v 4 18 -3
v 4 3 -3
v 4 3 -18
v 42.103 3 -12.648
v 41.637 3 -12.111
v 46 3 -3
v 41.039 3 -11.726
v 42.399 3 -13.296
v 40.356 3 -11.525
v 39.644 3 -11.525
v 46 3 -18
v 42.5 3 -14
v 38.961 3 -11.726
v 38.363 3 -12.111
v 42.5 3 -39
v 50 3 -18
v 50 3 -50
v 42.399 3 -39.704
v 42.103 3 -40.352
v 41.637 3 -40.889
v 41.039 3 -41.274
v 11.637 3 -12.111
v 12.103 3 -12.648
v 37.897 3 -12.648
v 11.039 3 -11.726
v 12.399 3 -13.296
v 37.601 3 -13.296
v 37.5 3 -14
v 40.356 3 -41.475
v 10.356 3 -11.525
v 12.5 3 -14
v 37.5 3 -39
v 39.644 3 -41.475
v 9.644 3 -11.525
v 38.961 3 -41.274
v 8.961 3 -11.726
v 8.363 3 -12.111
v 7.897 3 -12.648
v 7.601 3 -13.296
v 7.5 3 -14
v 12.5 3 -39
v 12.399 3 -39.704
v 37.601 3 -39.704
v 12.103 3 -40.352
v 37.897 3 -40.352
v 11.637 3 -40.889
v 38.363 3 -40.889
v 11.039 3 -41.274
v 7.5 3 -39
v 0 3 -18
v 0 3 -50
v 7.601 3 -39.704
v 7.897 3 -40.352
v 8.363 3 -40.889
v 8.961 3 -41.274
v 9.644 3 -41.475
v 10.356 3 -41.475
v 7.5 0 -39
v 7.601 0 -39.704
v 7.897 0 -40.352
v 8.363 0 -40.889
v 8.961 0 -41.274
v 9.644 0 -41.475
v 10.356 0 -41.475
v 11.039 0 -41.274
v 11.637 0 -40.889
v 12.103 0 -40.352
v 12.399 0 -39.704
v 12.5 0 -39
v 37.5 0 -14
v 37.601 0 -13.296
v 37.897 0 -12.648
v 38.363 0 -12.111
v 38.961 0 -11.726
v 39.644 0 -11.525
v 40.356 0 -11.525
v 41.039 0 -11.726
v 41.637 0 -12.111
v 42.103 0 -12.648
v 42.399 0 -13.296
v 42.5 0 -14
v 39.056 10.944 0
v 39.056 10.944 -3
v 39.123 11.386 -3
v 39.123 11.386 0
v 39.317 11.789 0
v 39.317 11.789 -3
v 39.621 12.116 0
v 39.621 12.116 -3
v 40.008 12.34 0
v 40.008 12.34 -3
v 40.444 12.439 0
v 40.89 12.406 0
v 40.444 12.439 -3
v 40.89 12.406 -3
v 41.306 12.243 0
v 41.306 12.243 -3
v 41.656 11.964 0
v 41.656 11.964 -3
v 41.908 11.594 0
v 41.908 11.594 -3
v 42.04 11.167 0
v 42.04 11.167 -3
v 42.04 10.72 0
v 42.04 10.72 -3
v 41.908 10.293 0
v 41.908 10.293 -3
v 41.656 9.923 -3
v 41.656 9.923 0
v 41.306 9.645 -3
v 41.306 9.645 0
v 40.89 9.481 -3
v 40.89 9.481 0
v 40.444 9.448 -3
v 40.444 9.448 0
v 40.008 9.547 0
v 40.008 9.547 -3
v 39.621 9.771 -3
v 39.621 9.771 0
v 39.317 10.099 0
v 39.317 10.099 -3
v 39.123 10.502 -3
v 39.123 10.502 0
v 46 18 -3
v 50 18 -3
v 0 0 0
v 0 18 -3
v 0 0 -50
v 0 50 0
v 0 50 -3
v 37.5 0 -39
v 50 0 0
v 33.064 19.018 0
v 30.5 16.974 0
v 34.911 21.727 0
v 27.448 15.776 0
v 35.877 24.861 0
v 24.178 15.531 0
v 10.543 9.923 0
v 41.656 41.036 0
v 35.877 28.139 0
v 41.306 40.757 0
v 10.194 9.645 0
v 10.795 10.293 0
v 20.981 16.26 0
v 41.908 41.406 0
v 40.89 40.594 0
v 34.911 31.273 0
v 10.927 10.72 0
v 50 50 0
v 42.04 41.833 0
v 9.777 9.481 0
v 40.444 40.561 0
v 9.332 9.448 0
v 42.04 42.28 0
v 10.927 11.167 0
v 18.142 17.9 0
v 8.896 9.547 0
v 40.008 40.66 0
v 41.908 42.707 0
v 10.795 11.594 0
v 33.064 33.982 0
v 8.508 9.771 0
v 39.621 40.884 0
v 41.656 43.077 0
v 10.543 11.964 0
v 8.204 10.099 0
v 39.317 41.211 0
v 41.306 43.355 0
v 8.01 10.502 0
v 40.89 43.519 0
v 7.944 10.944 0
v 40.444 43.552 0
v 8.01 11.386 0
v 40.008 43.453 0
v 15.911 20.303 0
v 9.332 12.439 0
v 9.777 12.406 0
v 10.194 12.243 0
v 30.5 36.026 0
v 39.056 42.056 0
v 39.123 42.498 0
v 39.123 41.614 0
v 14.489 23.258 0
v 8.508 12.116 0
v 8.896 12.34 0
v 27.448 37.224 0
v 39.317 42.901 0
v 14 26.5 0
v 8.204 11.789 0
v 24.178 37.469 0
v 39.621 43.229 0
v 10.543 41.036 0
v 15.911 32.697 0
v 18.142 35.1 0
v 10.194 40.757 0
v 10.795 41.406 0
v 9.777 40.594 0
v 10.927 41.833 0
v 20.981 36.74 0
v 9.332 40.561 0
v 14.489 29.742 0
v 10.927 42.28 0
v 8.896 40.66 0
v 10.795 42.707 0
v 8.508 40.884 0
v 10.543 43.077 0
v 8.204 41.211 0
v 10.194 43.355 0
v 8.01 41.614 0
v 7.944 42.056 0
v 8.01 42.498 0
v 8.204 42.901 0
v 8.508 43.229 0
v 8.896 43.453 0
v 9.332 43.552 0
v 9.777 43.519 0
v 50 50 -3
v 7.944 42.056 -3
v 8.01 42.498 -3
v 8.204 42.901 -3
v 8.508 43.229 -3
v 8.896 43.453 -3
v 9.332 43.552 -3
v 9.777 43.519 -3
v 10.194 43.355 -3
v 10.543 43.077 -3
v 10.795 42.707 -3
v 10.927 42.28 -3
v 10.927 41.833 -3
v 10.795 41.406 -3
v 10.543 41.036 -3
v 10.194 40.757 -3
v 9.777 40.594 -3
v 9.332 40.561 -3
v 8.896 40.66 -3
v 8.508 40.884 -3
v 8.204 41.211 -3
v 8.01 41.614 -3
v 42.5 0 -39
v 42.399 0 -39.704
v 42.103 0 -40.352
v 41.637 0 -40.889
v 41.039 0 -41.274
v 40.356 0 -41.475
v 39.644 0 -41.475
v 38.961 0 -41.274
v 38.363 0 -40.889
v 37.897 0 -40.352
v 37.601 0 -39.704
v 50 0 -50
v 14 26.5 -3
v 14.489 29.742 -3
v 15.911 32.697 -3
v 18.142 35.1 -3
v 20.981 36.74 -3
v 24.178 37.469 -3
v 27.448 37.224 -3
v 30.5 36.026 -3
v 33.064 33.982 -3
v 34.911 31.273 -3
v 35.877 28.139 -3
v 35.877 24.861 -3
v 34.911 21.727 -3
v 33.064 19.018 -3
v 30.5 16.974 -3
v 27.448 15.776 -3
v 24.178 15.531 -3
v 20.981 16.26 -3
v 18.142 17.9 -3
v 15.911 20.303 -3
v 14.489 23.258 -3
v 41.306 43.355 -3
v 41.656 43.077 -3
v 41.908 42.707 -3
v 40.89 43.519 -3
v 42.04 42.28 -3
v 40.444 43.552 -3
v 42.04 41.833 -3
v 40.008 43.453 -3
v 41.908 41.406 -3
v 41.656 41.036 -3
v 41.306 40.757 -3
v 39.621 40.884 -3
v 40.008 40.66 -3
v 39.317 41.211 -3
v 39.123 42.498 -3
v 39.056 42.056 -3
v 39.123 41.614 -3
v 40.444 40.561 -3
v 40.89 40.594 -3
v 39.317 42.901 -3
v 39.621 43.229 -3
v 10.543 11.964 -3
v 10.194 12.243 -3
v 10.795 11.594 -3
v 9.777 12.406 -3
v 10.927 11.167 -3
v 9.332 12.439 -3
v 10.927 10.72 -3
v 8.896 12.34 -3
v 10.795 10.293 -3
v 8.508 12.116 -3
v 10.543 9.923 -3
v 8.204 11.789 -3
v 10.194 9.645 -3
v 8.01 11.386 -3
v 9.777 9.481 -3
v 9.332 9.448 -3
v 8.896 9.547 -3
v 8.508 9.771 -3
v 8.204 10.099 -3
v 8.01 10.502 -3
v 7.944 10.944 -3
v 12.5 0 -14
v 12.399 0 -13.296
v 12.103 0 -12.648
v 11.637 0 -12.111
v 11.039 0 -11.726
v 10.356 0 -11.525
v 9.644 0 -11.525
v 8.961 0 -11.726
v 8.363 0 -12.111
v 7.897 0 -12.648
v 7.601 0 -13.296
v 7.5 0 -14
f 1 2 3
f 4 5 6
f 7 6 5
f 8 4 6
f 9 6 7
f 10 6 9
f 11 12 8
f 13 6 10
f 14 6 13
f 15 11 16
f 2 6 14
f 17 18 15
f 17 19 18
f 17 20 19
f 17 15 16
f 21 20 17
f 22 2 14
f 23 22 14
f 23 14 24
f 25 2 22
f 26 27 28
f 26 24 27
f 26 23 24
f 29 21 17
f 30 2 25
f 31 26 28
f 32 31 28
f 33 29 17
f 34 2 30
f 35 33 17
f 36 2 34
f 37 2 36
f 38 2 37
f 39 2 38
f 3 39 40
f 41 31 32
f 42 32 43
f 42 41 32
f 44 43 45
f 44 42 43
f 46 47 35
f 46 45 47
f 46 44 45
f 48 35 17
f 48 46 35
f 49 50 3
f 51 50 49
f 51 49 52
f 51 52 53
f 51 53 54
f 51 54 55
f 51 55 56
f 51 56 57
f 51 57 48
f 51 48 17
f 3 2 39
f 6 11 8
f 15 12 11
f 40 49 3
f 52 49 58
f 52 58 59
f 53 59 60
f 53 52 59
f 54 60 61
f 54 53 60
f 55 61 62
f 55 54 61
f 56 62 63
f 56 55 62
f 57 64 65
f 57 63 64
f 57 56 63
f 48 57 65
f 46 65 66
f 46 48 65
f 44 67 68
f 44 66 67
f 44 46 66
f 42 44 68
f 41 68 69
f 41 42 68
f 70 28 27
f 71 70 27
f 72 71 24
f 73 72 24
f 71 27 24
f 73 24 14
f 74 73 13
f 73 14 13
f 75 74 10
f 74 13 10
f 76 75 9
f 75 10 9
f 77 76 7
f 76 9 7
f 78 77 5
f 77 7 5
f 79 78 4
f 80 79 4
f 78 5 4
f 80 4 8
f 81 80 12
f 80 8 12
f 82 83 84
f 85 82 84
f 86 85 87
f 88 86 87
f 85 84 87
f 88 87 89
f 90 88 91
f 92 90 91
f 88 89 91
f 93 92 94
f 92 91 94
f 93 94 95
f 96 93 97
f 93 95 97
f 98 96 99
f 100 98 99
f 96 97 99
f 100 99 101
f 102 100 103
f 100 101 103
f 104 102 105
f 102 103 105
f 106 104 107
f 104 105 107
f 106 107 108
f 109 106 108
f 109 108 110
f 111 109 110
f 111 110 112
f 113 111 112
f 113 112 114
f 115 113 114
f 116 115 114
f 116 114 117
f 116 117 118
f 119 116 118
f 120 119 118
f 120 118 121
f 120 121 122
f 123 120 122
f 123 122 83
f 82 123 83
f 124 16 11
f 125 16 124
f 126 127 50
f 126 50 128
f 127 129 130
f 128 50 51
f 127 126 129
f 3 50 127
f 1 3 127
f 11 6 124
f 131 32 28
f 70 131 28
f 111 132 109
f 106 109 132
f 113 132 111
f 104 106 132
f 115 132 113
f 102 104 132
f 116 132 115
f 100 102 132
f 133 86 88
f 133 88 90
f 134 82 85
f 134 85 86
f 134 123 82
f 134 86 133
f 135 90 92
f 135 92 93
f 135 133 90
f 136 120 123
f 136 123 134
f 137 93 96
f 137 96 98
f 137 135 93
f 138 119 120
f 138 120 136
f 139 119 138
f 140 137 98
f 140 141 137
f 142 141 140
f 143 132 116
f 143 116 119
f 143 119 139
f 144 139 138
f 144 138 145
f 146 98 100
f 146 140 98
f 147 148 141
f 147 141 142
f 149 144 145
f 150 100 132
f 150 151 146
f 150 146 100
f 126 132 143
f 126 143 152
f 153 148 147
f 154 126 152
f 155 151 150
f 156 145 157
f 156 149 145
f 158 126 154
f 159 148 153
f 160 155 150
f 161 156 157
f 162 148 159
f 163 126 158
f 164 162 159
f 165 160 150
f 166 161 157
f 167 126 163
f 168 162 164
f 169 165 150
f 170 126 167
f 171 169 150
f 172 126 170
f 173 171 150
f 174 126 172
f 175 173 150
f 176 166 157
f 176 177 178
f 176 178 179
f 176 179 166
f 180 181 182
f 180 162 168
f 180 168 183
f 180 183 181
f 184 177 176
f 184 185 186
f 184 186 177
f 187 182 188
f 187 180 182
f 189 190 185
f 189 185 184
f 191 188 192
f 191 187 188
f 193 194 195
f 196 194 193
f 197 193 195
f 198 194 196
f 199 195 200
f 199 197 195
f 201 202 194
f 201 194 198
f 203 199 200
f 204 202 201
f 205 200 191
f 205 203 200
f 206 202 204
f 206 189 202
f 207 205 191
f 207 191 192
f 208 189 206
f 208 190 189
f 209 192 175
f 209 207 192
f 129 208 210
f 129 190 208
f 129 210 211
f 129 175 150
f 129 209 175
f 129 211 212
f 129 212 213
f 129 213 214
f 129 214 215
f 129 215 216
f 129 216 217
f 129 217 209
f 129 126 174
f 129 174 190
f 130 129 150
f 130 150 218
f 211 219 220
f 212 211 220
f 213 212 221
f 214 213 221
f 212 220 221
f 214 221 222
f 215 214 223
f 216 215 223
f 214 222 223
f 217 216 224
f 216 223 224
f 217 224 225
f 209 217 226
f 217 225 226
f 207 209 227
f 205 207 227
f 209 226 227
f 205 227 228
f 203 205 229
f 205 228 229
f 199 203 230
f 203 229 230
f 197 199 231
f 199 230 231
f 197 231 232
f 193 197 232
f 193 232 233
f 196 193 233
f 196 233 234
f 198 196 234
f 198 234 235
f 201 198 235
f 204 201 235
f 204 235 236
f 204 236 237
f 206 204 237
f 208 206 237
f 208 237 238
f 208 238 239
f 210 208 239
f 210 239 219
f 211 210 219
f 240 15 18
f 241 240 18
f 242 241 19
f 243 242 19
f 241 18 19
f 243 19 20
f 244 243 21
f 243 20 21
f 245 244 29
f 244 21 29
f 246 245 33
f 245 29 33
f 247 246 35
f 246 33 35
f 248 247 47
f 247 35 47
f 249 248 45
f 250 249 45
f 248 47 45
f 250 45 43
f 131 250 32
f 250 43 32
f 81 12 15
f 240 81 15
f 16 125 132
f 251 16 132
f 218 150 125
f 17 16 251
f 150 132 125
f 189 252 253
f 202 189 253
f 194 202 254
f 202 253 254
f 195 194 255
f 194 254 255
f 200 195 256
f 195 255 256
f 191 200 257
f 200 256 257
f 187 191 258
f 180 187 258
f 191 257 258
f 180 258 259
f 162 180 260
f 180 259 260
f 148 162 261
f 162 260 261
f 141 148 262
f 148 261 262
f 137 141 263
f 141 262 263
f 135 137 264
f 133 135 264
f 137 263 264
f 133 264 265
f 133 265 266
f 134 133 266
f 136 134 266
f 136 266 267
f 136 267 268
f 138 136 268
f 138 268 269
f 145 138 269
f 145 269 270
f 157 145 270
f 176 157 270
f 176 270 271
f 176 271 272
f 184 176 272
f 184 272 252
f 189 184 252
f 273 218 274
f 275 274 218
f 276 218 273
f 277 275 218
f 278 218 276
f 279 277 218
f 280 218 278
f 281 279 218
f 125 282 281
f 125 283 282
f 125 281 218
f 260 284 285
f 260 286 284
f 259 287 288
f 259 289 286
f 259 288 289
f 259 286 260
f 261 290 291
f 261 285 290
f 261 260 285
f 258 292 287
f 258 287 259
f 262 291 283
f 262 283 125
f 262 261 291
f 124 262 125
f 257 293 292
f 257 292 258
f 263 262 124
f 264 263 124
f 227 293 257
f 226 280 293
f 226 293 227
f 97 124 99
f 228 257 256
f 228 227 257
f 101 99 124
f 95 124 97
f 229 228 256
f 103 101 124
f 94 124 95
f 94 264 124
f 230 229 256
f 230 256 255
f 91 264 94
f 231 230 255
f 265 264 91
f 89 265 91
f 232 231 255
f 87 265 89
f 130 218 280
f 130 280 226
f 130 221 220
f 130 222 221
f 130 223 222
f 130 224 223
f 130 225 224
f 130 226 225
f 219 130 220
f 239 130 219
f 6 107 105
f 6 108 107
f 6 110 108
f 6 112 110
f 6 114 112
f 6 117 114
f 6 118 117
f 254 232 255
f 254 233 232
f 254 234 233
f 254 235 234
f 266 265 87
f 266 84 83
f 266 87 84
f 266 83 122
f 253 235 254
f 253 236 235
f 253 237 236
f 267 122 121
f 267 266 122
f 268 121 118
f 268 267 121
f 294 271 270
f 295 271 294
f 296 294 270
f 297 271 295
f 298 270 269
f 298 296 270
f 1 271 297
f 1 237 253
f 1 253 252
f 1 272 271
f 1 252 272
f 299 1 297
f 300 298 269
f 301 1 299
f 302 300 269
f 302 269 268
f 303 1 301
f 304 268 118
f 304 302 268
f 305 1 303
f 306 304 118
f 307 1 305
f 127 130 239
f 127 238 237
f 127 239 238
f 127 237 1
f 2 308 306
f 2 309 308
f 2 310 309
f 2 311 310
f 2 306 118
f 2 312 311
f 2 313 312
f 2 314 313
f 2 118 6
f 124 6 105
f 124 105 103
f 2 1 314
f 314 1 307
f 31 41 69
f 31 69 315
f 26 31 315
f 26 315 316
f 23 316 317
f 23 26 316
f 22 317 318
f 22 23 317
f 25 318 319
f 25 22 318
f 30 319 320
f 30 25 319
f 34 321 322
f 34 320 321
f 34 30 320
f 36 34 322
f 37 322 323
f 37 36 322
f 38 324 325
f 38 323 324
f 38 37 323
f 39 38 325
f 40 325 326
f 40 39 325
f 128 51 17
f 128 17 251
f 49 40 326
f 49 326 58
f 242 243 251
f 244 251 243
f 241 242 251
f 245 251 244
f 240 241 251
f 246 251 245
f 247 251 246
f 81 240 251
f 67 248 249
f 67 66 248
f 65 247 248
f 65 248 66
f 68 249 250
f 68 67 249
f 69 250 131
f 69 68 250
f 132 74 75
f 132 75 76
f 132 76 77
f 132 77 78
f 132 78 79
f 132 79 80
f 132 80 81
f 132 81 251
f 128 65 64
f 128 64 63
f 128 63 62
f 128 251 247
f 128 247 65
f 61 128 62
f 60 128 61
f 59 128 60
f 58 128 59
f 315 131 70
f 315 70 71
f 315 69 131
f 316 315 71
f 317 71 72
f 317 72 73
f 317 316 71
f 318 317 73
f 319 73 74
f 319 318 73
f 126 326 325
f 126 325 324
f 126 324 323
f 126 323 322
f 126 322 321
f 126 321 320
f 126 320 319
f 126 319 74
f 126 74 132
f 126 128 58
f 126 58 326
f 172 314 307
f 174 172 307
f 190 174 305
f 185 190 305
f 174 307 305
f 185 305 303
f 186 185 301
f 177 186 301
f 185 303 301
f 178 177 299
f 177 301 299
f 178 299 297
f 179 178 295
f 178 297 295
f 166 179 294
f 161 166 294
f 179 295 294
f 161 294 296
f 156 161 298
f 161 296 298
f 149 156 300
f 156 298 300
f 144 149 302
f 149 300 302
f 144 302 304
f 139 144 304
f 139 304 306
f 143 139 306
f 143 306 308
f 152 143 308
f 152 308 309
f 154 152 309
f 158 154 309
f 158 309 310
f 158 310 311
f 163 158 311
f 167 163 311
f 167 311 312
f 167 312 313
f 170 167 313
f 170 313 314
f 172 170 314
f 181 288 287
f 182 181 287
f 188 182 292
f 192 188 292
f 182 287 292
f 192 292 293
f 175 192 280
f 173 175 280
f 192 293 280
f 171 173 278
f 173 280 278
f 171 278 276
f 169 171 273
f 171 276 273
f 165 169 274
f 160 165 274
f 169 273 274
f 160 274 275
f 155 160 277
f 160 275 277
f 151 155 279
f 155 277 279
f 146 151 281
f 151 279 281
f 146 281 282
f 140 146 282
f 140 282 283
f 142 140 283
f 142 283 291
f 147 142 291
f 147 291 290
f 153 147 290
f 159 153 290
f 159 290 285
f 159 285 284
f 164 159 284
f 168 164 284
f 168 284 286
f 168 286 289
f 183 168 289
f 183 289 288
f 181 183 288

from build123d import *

# Parameters (mm, degrees)
BOSS_EXTRUDE1_DEPTH = 50
SKETCH3_R           = 11
CUT_EXTRUDE1_DEPTH  = 20
CUT_EXTRUDE2_DEPTH  = 4
BOSS_EXTRUDE2_DEPTH = 4
SKETCH7_R           = 1.5
CUT_EXTRUDE3_DEPTH  = 4


with BuildPart() as part:
    # Sketch1 → Boss-Extrude1 (new body)
    with BuildSketch(Plane(origin=(0, 0, 0), x_dir=(0, 0, -1), z_dir=(1, 0, 0))):
        Polygon((0, 0), (0, 50), (3, 50), (3, 3), (50, 3), (50, 0), align=None)
    extrude(amount=BOSS_EXTRUDE1_DEPTH)

    # Sketch3 → Cut-Extrude1 (cut)
    with BuildSketch(Plane(origin=(0, 0, -3), x_dir=(-1, 0, 0), z_dir=(0, 0, -1))):
        with Locations((-25, 26.5)):
            Circle(SKETCH3_R)
    extrude(amount=-CUT_EXTRUDE1_DEPTH, mode=Mode.SUBTRACT)

    # Sketch4 → Cut-Extrude2 (cut, through all)
    with BuildSketch(Plane(origin=(0, 3, 0), x_dir=(1, 0, 0), z_dir=(0, 1, 0))):
        with BuildLine():
            Line((7.5, 14), (7.5, 39))
            ThreePointArc((7.5, 39), (10, 41.5), (12.5, 39))
            Line((12.5, 39), (12.5, 14))
            ThreePointArc((12.5, 14), (10, 11.5), (7.5, 14))
        make_face()
        with BuildLine():
            Line((42.5, 14), (42.5, 39))
            ThreePointArc((42.5, 39), (40, 41.5), (37.5, 39))
            Line((37.5, 39), (37.5, 14))
            ThreePointArc((37.5, 14), (40, 11.5), (42.5, 14))
        make_face()
    extrude(amount=-CUT_EXTRUDE2_DEPTH, mode=Mode.SUBTRACT)

    # Sketch6 → Boss-Extrude2 (add)
    with BuildSketch(Plane(origin=(50, 0, 0), x_dir=(0, 0, -1), z_dir=(1, 0, 0))):
        Polygon((3, 3), (18, 3), (3, 18), align=None)
    boss_extrude2 = extrude(amount=-BOSS_EXTRUDE2_DEPTH)

    # Mirror1: Boss-Extrude2 across plane
    add(boss_extrude2.mirror(Plane(origin=(25, 0, 0), x_dir=(0, 0, 1), z_dir=(1, 0, 0))))

    # Sketch7 → Cut-Extrude3 (cut, through all)
    with BuildSketch(Plane(origin=(0, 0, -3), x_dir=(-1, 0, 0), z_dir=(0, 0, -1))):
        with Locations((-40.556349186, 42.056349186)):
            Circle(SKETCH7_R)
        with Locations((-9.443650814, 42.056349186)):
            Circle(SKETCH7_R)
        with Locations((-40.556349186, 10.943650814)):
            Circle(SKETCH7_R)
        with Locations((-9.443650814, 10.943650814)):
            Circle(SKETCH7_R)
    extrude(amount=-CUT_EXTRUDE3_DEPTH, mode=Mode.SUBTRACT)


solid = part.part
